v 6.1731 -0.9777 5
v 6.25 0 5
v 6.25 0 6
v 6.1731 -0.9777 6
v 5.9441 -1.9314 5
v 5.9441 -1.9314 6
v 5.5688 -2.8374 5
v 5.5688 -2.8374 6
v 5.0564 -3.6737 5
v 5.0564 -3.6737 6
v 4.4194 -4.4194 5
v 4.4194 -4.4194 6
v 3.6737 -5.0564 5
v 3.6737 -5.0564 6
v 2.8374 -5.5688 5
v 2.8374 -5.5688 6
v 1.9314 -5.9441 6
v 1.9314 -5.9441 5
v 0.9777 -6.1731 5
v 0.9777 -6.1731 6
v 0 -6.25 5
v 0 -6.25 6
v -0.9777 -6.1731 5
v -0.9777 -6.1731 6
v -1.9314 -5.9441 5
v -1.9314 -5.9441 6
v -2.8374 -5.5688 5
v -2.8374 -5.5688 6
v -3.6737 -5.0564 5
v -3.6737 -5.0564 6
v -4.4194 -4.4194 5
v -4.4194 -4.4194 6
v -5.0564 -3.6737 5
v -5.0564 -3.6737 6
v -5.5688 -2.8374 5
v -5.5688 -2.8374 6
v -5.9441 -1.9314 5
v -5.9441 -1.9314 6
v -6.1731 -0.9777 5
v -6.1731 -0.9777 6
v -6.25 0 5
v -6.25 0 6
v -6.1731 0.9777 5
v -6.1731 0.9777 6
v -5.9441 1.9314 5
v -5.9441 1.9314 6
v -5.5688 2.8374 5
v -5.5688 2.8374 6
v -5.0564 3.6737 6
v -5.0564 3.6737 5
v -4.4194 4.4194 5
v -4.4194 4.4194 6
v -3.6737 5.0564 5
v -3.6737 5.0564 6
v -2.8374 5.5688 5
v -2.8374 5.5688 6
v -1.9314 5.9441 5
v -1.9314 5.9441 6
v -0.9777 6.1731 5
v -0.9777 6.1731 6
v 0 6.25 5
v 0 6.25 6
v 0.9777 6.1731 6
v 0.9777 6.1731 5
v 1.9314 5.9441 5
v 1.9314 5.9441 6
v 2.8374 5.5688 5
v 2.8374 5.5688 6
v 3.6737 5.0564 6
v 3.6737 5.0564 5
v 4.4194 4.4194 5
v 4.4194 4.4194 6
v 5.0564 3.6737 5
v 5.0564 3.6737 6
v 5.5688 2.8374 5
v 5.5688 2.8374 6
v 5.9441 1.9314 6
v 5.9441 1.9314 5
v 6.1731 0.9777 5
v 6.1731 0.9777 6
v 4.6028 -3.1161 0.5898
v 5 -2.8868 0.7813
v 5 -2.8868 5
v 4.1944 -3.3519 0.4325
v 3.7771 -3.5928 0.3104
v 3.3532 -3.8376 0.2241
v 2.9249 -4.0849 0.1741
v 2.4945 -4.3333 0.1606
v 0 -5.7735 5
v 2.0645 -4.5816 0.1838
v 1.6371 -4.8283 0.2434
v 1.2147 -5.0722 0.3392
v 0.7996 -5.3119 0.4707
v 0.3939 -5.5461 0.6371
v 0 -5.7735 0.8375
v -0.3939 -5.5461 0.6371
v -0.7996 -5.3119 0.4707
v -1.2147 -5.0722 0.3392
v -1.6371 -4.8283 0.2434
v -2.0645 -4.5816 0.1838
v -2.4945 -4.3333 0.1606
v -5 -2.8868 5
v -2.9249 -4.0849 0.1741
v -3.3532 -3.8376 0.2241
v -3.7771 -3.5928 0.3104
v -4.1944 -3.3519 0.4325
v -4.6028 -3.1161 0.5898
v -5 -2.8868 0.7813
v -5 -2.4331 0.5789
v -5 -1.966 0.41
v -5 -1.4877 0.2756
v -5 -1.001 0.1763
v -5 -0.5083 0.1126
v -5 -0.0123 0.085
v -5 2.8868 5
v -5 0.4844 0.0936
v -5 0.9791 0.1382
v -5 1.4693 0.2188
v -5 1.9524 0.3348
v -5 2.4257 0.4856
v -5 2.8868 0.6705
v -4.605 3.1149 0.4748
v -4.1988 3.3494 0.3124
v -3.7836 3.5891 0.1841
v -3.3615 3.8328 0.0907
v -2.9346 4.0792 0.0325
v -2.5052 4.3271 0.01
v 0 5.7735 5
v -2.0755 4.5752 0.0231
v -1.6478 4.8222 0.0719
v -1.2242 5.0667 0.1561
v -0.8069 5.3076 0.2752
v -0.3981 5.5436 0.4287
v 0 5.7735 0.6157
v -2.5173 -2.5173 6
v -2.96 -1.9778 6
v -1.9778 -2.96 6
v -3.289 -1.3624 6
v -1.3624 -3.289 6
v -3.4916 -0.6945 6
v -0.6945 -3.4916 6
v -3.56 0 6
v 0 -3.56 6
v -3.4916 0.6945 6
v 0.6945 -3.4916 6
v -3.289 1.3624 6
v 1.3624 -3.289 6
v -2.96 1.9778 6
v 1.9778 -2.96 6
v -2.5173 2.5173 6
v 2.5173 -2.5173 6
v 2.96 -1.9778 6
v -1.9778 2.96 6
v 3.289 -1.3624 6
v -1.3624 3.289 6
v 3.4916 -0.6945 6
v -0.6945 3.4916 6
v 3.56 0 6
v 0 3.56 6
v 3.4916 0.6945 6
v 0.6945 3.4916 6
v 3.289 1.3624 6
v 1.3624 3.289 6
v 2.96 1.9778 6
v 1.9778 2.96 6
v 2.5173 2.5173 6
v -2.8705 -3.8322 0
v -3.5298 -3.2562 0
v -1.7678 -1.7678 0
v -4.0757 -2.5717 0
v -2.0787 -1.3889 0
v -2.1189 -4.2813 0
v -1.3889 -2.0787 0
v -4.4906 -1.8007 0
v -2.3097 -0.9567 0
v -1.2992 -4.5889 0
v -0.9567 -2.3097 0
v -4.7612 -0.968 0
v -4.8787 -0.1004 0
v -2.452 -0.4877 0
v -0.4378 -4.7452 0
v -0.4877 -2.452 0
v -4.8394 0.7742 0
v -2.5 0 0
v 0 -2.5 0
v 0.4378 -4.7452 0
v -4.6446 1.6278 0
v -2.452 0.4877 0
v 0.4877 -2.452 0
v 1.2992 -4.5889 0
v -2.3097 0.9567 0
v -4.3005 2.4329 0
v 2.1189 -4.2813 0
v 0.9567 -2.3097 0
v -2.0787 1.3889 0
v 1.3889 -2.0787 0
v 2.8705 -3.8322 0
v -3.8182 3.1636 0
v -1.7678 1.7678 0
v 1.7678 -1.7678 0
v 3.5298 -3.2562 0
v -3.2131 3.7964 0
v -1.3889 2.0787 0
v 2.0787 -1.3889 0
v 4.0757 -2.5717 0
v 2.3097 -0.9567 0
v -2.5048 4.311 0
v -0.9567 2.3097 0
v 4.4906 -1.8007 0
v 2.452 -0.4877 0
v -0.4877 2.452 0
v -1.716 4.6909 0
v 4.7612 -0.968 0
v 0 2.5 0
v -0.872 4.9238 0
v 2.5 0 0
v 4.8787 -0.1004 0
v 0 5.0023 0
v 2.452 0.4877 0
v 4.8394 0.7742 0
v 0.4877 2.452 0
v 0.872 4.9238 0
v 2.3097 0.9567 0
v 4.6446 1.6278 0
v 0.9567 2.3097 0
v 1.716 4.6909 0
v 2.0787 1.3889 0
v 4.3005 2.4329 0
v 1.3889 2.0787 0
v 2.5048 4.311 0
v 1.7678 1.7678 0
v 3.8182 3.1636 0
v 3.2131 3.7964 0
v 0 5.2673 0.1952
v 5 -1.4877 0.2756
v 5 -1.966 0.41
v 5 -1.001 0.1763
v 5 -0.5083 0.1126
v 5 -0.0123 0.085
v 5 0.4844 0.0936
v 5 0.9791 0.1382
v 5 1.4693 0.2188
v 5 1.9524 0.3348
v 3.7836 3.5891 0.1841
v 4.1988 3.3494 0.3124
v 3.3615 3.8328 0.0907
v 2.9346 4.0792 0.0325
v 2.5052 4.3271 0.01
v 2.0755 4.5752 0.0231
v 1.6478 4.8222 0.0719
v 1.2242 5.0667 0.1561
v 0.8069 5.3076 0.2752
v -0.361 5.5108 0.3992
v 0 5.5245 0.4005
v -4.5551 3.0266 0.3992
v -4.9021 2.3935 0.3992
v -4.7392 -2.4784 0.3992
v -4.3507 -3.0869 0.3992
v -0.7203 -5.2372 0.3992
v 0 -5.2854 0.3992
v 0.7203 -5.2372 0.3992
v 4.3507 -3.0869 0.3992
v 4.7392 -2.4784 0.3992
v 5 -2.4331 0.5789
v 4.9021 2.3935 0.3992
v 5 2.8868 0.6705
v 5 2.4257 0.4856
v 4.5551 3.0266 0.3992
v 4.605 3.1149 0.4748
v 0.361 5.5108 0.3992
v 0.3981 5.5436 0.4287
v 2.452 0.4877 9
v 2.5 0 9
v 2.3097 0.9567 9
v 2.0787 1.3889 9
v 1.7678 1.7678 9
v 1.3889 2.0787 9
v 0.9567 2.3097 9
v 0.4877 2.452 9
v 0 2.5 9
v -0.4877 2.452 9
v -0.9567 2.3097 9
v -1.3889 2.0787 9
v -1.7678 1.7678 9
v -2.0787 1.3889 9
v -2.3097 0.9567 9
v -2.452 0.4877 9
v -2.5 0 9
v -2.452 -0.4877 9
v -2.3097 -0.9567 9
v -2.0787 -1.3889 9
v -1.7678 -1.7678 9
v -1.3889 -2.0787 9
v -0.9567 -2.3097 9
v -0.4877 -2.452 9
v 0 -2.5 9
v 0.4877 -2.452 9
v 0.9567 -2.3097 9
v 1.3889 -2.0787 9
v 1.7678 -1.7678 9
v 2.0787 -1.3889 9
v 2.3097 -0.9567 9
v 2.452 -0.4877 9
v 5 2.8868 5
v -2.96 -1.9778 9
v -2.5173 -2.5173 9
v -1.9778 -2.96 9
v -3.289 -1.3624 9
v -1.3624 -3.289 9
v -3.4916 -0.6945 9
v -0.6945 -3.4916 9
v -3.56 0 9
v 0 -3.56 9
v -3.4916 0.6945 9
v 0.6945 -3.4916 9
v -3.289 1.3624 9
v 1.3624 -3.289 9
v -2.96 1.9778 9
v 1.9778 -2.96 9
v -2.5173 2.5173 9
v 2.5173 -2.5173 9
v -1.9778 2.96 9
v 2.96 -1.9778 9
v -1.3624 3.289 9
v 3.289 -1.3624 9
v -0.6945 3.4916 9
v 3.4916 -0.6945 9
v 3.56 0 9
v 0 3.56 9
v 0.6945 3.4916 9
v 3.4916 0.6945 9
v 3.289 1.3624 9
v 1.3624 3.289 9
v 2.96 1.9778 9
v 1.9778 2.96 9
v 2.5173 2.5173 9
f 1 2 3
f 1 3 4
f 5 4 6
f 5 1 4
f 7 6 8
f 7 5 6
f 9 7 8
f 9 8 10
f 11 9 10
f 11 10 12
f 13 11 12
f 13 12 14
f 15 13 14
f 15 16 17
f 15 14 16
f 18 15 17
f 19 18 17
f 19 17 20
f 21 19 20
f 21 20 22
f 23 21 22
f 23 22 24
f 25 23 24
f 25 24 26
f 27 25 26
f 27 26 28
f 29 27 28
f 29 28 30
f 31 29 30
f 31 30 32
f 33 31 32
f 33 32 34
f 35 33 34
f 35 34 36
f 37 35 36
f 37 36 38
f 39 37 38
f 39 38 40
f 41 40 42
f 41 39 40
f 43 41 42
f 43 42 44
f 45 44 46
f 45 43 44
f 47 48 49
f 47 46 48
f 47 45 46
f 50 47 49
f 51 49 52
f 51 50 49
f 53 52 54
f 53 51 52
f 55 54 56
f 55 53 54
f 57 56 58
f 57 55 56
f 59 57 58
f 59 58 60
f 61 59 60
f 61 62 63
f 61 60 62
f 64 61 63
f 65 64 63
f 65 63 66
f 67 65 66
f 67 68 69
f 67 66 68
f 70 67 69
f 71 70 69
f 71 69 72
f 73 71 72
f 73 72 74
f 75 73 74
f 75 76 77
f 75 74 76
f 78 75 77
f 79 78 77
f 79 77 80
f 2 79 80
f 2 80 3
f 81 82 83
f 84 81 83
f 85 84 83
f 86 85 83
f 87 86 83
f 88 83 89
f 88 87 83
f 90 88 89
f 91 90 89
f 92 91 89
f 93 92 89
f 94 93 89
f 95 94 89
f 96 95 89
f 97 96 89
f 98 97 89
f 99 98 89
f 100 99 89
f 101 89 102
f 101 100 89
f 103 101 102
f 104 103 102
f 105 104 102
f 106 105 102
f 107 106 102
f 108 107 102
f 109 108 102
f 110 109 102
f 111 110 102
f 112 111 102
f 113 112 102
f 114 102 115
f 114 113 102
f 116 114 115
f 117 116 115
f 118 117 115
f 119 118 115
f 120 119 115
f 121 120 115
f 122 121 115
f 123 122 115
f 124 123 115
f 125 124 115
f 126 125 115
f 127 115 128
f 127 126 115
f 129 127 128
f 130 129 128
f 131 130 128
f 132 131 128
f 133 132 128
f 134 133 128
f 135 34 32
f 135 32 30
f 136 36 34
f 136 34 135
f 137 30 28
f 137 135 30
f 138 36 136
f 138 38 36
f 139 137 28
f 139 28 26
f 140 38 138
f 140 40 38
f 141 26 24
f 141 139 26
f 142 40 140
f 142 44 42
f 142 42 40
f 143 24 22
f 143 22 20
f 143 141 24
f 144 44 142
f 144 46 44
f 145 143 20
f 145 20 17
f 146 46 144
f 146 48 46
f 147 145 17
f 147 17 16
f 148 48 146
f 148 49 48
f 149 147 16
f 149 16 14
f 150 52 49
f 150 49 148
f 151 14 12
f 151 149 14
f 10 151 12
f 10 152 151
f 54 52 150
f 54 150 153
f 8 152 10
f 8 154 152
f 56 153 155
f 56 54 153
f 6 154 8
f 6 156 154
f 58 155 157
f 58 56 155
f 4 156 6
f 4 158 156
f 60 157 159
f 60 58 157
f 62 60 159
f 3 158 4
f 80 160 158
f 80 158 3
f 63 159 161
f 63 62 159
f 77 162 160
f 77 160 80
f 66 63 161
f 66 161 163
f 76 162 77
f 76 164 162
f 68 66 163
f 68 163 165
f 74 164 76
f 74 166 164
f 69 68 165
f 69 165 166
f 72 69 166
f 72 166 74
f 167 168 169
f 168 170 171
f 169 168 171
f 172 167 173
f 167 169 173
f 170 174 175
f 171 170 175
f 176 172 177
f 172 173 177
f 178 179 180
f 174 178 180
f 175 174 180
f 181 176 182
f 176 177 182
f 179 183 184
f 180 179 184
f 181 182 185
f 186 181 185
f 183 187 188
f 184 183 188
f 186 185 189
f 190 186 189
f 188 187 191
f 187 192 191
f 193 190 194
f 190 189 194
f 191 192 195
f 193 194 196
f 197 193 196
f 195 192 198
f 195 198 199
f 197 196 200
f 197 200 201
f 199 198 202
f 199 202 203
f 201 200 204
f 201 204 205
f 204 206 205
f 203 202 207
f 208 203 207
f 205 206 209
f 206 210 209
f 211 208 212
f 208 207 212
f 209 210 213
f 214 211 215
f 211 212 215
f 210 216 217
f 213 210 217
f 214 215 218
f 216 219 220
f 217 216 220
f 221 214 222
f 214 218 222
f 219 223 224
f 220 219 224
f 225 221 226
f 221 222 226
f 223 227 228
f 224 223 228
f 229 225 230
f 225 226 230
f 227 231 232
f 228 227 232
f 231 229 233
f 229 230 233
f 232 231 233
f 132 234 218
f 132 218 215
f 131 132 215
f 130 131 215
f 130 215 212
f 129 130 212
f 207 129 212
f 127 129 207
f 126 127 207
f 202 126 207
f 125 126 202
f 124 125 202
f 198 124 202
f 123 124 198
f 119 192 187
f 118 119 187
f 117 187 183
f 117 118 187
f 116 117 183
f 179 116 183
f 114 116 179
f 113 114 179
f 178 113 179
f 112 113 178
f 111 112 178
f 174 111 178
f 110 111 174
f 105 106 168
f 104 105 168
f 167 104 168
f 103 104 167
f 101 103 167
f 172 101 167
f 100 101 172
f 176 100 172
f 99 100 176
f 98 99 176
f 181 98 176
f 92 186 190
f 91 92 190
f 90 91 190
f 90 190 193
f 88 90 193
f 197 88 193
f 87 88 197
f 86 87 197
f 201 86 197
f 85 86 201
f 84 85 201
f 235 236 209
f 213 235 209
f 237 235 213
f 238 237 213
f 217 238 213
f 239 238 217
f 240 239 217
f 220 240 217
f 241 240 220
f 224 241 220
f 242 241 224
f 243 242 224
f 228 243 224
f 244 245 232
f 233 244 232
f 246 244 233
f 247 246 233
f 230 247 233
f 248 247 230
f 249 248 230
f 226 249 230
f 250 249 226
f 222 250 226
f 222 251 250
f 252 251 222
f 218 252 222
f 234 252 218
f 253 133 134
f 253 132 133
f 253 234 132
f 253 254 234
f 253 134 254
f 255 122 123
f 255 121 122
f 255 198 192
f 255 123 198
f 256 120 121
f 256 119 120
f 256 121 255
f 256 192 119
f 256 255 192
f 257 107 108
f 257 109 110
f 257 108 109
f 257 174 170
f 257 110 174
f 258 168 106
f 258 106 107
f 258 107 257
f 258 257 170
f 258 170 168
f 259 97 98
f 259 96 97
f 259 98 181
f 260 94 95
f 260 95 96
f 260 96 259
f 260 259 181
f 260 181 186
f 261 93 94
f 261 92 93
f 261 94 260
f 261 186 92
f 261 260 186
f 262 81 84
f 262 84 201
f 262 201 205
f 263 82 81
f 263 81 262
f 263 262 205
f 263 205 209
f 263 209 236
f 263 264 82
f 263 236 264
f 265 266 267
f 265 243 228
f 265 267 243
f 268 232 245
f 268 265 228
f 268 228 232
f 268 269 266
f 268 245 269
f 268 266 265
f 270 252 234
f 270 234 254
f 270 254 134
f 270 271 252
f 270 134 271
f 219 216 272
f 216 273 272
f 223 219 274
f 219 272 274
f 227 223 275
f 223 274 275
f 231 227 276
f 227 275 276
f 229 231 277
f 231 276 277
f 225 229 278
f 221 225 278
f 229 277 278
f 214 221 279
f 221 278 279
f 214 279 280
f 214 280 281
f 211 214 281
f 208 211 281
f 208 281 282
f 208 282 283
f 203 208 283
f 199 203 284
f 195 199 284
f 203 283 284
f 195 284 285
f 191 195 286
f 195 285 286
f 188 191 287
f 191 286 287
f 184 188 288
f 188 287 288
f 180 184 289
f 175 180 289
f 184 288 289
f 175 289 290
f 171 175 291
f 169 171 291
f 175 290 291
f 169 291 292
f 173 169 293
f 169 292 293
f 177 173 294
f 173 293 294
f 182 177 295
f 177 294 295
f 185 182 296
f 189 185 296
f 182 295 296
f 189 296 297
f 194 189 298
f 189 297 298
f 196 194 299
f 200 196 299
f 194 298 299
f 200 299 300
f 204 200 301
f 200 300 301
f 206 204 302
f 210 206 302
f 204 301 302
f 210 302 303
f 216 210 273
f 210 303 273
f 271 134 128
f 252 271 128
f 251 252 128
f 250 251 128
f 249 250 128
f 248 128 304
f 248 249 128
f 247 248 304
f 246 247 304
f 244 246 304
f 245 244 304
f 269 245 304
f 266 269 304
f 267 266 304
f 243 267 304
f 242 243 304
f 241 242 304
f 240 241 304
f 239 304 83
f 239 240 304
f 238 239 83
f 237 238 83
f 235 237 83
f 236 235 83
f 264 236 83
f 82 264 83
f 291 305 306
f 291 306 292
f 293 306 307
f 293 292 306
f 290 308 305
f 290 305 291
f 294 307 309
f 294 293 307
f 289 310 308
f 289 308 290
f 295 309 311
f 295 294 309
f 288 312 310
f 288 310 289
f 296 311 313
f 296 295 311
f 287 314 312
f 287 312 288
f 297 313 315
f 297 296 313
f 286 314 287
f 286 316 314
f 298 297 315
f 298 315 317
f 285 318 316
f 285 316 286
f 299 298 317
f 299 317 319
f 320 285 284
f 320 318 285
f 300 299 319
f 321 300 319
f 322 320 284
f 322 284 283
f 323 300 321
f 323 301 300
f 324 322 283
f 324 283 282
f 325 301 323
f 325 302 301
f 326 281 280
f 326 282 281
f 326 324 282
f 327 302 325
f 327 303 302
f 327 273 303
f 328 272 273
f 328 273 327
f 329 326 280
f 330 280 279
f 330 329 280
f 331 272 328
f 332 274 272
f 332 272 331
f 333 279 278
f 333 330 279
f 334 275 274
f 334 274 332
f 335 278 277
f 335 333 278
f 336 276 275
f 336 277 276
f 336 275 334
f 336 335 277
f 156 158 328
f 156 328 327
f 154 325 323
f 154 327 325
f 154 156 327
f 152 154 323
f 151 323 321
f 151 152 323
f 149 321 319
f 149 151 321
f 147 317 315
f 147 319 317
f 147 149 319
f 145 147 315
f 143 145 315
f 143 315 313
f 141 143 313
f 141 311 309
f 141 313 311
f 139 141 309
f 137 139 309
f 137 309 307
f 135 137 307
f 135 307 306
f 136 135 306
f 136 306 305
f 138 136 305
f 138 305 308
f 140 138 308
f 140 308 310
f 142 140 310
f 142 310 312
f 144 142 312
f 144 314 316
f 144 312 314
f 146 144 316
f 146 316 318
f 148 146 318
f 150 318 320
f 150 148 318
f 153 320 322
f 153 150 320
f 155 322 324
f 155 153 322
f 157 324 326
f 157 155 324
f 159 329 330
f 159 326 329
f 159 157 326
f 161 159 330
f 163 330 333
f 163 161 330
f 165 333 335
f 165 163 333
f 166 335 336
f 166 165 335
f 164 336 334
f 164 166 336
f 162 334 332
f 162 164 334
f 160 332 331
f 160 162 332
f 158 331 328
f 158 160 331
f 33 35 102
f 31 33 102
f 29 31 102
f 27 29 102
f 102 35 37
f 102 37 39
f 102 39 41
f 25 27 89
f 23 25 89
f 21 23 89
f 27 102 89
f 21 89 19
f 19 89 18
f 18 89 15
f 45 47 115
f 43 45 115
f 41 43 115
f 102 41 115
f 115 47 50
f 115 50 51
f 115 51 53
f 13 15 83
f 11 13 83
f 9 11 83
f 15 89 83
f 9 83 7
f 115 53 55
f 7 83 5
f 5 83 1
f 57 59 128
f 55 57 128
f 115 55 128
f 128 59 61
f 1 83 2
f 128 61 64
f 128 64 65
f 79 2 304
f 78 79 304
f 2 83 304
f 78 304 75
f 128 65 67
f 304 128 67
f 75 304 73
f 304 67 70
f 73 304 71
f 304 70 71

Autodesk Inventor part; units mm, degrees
ref_plane "YZ Plane" through (0, 0, 0) normal (1, 0, 0) x (0, 1, 0)
ref_plane "XZ Plane" through (0, 0, 0) normal (0, 1, 0) x (-1, 0, 0)
ref_plane "XY Plane" through (0, 0, 0) normal (0, 0, 1) x (1, 0, 0)
sketch "Sketch1" plane through (0, 0, 0) normal (0, 0, 1) x (1, 0, 0)
  line L0 (5, -2.8868) -> (0, -5.7735)
  line L1 (0, -5.7735) -> (-5, -2.8868)
  line L2 (-5, -2.8868) -> (-5, 2.8868)
  line L3 (-5, 2.8868) -> (0, 5.7735)
  line L4 (0, 5.7735) -> (5, 2.8868)
  line L5 (5, 2.8868) -> (5, -2.8868)
  point P0 (0, 0)
  point P1 (0, 0)
  dimension "d0" = 10
extrude "Extrusion1" add sketch "Sketch1" along normal blind 5
sketch "Sketch2" plane through (0, 0, 5) normal (0, 0, 1) x (1, 0, 0)
  circle A0 centre (0, 0) radius 6.25
  dimension "d3" = 12.5
extrude "Extrusion2" add sketch "Sketch2" along normal blind 1
sketch "Sketch3" plane through (0, 0, 6) normal (0, 0, 1) x (1, 0, 0)
  circle A0 centre (0, 0) radius 6.25 projected
  circle A1 centre (0, 0) radius 3.56
  dimension "d6" = 7.12
extrude "Extrusion3" add sketch "Sketch3" along normal blind 3 contours A1
sketch "Sketch4" plane through (0, 0, 9) normal (0, 0, 1) x (1, 0, 0)
  circle A0 centre (0, 0) radius 3.56 projected
  circle A1 centre (0, 0) radius 2.5
  dimension "d9" = 5
extrude "Extrusion4" cut sketch "Sketch4" against normal up to next contours A1
sketch "Sketch5" plane through (0, 0, 0) normal (1, 0, 0) x (0, 1, 0)
  arc A0 (0.1187, -1.552) -> (0.1187, 15.367) centre (0.1187, 6.9075) ccw
  arc A1 (0.1187, -2.8398) -> (0.1187, 16.6548) centre (0.1187, 6.9075) ccw
  line L0 (0.1187, -2.8398) -> (0.1187, 16.6548)
  point P0 (0, 0)
revolve "Revolution1" cut sketch "Sketch5" angle 360 about axis through (0, 0.1187, -2.8398) along (0, 0, 1) contours A0 L0 A1
properties part number "Eccentric Spacer 6mm"
